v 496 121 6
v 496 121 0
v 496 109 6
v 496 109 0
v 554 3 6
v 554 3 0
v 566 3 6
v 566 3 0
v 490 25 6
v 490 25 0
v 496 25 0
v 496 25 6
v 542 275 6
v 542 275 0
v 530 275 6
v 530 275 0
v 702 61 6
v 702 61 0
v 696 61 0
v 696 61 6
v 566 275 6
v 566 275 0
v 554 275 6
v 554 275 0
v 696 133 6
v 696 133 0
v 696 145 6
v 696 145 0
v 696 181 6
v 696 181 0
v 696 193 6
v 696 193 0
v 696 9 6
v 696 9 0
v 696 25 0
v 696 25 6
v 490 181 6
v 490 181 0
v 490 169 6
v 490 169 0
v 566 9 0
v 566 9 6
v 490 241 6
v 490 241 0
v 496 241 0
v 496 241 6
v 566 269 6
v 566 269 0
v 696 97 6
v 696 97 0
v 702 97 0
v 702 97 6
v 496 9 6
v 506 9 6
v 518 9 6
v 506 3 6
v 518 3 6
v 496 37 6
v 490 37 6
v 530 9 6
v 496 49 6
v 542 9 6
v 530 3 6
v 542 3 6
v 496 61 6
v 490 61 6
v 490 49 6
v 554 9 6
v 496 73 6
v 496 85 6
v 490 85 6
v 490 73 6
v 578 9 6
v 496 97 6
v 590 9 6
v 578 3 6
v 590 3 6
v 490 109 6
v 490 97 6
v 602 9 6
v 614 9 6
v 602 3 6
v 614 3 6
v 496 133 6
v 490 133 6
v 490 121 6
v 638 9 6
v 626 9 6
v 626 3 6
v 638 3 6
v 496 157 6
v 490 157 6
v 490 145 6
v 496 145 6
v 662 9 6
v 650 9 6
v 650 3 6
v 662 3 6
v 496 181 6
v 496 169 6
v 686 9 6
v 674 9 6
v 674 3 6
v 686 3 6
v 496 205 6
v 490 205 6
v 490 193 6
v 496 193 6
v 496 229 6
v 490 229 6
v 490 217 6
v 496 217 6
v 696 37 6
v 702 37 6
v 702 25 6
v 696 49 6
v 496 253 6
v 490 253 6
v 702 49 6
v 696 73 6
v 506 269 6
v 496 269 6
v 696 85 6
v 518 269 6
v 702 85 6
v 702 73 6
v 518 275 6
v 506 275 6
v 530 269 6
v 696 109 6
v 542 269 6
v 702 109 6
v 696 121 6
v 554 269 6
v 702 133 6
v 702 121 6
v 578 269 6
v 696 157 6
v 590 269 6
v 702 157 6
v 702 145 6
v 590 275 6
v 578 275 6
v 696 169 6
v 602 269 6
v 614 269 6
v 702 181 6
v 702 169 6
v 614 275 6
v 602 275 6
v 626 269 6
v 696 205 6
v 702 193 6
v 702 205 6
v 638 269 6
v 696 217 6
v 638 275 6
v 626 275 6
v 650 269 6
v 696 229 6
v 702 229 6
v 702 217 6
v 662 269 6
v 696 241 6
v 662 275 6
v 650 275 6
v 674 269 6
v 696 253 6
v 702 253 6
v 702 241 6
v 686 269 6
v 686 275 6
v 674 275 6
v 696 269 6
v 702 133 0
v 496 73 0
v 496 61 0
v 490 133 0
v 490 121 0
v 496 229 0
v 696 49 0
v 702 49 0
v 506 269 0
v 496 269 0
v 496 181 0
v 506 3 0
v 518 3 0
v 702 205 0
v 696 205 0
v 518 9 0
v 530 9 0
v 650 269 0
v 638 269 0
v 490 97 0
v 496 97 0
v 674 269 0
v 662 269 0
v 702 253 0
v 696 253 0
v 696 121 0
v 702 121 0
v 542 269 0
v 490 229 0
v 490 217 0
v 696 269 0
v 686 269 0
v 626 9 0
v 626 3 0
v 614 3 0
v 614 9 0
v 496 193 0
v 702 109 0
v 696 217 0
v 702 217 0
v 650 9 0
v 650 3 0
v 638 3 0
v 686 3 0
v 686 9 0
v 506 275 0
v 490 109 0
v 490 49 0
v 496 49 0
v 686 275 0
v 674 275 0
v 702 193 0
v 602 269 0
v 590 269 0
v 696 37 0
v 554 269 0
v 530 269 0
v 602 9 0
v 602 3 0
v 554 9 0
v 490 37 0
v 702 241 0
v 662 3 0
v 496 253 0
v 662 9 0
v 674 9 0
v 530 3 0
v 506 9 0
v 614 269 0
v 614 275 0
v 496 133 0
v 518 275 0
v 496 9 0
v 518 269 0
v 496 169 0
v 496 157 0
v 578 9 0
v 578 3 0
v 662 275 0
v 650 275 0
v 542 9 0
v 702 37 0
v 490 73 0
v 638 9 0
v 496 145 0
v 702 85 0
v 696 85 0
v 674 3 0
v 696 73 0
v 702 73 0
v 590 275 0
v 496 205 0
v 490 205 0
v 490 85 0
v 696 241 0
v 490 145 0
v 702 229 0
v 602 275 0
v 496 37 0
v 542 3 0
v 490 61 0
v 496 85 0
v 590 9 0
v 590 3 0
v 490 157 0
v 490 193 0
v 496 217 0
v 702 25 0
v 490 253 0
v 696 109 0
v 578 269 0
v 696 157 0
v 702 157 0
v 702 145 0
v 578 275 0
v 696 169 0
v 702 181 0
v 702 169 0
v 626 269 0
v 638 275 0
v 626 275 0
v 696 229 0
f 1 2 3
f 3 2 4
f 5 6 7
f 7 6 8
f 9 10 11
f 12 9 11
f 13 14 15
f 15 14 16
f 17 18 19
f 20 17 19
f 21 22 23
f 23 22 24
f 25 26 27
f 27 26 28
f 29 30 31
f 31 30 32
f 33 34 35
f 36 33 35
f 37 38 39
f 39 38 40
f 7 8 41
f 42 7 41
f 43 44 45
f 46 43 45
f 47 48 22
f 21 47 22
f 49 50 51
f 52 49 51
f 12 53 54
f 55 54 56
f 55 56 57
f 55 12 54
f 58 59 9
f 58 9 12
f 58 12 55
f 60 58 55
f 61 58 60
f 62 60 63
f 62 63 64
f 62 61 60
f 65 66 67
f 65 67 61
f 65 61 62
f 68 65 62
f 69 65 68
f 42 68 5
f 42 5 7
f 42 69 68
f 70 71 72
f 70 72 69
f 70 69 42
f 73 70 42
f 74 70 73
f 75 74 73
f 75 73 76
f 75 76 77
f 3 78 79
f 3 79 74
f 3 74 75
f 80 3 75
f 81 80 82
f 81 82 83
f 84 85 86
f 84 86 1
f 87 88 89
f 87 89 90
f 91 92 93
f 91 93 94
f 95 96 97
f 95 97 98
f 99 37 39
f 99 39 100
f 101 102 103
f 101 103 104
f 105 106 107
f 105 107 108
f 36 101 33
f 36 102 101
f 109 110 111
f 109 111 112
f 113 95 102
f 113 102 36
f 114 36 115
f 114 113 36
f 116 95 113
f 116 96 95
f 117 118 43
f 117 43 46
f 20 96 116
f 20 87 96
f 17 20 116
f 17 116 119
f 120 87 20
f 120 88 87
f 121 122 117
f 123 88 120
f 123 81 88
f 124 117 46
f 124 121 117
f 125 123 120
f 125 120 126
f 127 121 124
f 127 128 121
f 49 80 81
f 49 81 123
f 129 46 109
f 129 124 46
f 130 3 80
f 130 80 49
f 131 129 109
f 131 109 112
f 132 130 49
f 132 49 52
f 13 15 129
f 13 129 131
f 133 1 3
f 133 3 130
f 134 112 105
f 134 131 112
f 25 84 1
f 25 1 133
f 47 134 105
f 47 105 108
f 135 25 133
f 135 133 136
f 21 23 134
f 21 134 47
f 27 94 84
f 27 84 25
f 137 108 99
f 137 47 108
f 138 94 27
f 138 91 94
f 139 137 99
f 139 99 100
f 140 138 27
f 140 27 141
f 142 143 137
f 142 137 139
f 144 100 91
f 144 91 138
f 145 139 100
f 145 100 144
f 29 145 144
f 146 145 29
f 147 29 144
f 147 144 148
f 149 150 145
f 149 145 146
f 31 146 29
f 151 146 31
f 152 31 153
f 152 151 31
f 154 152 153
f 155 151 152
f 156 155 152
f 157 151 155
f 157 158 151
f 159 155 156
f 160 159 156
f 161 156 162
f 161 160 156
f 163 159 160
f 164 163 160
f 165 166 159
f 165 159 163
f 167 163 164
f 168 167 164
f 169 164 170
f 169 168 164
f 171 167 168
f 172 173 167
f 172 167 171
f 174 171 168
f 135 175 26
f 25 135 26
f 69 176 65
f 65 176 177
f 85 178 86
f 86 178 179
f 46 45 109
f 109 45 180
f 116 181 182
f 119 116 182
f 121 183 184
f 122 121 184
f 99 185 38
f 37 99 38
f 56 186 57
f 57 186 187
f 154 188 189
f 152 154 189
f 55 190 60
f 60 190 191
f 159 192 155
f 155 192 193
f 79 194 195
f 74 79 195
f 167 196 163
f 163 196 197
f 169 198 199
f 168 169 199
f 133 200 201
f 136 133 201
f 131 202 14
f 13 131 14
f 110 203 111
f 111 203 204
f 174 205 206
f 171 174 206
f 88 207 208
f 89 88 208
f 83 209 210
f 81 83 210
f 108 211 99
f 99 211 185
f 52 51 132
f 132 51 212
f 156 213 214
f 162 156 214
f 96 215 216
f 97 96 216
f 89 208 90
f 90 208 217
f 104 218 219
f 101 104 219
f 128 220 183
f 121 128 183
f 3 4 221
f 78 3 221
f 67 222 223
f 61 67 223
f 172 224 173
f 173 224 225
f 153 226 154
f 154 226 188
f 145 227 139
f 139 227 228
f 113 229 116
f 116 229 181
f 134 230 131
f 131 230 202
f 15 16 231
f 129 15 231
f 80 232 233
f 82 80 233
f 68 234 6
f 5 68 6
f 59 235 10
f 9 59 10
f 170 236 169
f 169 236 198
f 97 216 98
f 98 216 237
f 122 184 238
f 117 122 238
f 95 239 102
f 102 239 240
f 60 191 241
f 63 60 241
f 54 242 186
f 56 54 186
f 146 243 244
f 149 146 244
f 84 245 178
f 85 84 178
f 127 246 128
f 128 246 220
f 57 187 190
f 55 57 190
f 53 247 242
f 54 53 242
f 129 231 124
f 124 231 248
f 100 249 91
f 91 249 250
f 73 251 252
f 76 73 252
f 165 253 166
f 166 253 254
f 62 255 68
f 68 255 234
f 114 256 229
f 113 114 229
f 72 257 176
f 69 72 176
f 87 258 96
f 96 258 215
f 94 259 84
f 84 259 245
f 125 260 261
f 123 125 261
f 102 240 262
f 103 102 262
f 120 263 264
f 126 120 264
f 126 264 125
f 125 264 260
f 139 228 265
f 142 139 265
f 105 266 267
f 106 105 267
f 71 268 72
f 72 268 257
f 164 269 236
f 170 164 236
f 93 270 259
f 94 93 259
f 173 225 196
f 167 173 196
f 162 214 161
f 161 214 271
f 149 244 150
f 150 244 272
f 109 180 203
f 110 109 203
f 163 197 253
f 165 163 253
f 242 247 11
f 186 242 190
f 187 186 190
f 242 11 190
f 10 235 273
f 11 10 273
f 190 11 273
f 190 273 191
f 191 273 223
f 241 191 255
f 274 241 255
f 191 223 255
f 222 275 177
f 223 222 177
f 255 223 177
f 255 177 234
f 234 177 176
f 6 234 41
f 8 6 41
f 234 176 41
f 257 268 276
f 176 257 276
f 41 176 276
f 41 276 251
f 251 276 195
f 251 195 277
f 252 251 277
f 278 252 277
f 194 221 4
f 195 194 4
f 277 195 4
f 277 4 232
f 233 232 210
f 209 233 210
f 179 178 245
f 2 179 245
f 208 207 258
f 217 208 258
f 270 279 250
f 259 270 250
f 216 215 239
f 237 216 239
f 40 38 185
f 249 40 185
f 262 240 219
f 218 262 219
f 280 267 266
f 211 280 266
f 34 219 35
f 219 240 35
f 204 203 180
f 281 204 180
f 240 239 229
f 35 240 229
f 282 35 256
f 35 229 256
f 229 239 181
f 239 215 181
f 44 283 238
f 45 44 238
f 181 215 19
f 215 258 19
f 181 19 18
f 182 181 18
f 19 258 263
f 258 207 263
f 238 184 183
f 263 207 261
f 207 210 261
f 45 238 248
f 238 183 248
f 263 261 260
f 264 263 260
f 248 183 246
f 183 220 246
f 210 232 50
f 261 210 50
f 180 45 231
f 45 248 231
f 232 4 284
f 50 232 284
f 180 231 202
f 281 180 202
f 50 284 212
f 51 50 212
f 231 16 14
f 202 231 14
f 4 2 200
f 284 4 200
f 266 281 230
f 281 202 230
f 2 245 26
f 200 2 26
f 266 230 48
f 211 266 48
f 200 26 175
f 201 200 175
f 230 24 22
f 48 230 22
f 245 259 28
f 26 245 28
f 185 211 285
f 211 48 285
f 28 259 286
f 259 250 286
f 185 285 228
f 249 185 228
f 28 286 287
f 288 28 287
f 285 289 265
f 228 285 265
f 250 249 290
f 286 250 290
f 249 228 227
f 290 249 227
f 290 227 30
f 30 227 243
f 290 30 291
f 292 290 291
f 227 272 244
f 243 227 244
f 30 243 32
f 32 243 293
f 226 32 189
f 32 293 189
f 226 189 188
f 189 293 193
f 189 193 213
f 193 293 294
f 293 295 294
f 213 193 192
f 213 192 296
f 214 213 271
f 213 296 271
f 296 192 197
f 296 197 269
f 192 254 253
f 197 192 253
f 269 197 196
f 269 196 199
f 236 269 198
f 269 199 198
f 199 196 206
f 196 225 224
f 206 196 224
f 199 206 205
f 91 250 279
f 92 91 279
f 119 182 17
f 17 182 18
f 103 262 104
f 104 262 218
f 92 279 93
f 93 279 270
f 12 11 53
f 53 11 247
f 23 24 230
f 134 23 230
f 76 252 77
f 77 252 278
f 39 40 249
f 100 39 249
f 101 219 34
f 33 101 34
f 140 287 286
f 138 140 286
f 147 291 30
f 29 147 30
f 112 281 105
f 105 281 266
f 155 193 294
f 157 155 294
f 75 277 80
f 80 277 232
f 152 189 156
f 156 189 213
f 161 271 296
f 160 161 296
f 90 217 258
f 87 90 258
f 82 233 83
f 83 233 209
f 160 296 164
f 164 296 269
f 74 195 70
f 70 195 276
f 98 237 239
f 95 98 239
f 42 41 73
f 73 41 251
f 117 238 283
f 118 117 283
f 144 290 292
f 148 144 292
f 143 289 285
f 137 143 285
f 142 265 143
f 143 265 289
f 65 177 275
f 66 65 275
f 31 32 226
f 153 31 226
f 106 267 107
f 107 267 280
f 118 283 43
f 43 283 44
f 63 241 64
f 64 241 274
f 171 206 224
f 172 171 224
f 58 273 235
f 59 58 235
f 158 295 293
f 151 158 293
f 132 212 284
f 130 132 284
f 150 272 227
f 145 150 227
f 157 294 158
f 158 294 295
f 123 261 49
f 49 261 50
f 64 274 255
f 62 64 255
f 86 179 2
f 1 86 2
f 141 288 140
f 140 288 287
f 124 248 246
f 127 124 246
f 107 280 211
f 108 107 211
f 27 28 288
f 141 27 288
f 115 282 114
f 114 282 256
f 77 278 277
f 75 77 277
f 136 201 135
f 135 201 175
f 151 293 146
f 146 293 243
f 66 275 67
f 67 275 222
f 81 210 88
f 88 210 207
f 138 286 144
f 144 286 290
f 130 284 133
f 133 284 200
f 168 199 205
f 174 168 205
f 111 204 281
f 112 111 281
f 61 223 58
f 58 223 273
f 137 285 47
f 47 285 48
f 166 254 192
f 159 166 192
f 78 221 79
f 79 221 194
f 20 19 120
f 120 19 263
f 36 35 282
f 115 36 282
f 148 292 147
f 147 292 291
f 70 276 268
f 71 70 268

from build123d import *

# Parameters (mm, degrees)
BOSS_EXTRUDE1_DEPTH = 6


with BuildPart() as part:
    # Model → Boss-Extrude1 (new body)
    with BuildSketch(Plane.XY):
        Polygon((496, 269), (496, 253), (490, 253), (490, 241), (496, 241), (496, 229), (490, 229), (490, 217), (496, 217), (496, 205), (490, 205), (490, 193), (496, 193), (496, 181), (490, 181), (490, 169), (496, 169), (496, 157), (490, 157), (490, 145), (496, 145), (496, 133), (490, 133), (490, 121), (496, 121), (496, 109), (490, 109), (490, 97), (496, 97), (496, 85), (490, 85), (490, 73), (496, 73), (496, 61), (490, 61), (490, 49), (496, 49), (496, 37), (490, 37), (490, 25), (496, 25), (496, 13), (496, 9), (506, 9), (506, 3), (518, 3), (518, 9), (530, 9), (530, 3), (542, 3), (542, 9), (554, 9), (554, 3), (566, 3), (566, 9), (578, 9), (578, 3), (590, 3), (590, 9), (602, 9), (602, 3), (614, 3), (614, 9), (626, 9), (626, 3), (638, 3), (638, 9), (650, 9), (650, 3), (662, 3), (662, 9), (674, 9), (674, 3), (686, 3), (686, 9), (696, 9), (696, 25), (702, 25), (702, 37), (696, 37), (696, 49), (702, 49), (702, 61), (696, 61), (696, 73), (702, 73), (702, 85), (696, 85), (696, 97), (702, 97), (702, 109), (696, 109), (696, 121), (702, 121), (702, 133), (696, 133), (696, 145), (702, 145), (702, 157), (696, 157), (696, 169), (702, 169), (702, 181), (696, 181), (696, 193), (702, 193), (702, 205), (696, 205), (696, 217), (702, 217), (702, 229), (696, 229), (696, 241), (702, 241), (702, 253), (696, 253), (696, 265), (696, 269), (686, 269), (686, 275), (674, 275), (674, 269), (662, 269), (662, 275), (650, 275), (650, 269), (638, 269), (638, 275), (626, 275), (626, 269), (614, 269), (614, 275), (602, 275), (602, 269), (590, 269), (590, 275), (578, 275), (578, 269), (566, 269), (566, 275), (554, 275), (554, 269), (542, 269), (542, 275), (530, 275), (530, 269), (518, 269), (518, 275), (506, 275), (506, 269), align=None)
    extrude(amount=BOSS_EXTRUDE1_DEPTH)


solid = part.part
